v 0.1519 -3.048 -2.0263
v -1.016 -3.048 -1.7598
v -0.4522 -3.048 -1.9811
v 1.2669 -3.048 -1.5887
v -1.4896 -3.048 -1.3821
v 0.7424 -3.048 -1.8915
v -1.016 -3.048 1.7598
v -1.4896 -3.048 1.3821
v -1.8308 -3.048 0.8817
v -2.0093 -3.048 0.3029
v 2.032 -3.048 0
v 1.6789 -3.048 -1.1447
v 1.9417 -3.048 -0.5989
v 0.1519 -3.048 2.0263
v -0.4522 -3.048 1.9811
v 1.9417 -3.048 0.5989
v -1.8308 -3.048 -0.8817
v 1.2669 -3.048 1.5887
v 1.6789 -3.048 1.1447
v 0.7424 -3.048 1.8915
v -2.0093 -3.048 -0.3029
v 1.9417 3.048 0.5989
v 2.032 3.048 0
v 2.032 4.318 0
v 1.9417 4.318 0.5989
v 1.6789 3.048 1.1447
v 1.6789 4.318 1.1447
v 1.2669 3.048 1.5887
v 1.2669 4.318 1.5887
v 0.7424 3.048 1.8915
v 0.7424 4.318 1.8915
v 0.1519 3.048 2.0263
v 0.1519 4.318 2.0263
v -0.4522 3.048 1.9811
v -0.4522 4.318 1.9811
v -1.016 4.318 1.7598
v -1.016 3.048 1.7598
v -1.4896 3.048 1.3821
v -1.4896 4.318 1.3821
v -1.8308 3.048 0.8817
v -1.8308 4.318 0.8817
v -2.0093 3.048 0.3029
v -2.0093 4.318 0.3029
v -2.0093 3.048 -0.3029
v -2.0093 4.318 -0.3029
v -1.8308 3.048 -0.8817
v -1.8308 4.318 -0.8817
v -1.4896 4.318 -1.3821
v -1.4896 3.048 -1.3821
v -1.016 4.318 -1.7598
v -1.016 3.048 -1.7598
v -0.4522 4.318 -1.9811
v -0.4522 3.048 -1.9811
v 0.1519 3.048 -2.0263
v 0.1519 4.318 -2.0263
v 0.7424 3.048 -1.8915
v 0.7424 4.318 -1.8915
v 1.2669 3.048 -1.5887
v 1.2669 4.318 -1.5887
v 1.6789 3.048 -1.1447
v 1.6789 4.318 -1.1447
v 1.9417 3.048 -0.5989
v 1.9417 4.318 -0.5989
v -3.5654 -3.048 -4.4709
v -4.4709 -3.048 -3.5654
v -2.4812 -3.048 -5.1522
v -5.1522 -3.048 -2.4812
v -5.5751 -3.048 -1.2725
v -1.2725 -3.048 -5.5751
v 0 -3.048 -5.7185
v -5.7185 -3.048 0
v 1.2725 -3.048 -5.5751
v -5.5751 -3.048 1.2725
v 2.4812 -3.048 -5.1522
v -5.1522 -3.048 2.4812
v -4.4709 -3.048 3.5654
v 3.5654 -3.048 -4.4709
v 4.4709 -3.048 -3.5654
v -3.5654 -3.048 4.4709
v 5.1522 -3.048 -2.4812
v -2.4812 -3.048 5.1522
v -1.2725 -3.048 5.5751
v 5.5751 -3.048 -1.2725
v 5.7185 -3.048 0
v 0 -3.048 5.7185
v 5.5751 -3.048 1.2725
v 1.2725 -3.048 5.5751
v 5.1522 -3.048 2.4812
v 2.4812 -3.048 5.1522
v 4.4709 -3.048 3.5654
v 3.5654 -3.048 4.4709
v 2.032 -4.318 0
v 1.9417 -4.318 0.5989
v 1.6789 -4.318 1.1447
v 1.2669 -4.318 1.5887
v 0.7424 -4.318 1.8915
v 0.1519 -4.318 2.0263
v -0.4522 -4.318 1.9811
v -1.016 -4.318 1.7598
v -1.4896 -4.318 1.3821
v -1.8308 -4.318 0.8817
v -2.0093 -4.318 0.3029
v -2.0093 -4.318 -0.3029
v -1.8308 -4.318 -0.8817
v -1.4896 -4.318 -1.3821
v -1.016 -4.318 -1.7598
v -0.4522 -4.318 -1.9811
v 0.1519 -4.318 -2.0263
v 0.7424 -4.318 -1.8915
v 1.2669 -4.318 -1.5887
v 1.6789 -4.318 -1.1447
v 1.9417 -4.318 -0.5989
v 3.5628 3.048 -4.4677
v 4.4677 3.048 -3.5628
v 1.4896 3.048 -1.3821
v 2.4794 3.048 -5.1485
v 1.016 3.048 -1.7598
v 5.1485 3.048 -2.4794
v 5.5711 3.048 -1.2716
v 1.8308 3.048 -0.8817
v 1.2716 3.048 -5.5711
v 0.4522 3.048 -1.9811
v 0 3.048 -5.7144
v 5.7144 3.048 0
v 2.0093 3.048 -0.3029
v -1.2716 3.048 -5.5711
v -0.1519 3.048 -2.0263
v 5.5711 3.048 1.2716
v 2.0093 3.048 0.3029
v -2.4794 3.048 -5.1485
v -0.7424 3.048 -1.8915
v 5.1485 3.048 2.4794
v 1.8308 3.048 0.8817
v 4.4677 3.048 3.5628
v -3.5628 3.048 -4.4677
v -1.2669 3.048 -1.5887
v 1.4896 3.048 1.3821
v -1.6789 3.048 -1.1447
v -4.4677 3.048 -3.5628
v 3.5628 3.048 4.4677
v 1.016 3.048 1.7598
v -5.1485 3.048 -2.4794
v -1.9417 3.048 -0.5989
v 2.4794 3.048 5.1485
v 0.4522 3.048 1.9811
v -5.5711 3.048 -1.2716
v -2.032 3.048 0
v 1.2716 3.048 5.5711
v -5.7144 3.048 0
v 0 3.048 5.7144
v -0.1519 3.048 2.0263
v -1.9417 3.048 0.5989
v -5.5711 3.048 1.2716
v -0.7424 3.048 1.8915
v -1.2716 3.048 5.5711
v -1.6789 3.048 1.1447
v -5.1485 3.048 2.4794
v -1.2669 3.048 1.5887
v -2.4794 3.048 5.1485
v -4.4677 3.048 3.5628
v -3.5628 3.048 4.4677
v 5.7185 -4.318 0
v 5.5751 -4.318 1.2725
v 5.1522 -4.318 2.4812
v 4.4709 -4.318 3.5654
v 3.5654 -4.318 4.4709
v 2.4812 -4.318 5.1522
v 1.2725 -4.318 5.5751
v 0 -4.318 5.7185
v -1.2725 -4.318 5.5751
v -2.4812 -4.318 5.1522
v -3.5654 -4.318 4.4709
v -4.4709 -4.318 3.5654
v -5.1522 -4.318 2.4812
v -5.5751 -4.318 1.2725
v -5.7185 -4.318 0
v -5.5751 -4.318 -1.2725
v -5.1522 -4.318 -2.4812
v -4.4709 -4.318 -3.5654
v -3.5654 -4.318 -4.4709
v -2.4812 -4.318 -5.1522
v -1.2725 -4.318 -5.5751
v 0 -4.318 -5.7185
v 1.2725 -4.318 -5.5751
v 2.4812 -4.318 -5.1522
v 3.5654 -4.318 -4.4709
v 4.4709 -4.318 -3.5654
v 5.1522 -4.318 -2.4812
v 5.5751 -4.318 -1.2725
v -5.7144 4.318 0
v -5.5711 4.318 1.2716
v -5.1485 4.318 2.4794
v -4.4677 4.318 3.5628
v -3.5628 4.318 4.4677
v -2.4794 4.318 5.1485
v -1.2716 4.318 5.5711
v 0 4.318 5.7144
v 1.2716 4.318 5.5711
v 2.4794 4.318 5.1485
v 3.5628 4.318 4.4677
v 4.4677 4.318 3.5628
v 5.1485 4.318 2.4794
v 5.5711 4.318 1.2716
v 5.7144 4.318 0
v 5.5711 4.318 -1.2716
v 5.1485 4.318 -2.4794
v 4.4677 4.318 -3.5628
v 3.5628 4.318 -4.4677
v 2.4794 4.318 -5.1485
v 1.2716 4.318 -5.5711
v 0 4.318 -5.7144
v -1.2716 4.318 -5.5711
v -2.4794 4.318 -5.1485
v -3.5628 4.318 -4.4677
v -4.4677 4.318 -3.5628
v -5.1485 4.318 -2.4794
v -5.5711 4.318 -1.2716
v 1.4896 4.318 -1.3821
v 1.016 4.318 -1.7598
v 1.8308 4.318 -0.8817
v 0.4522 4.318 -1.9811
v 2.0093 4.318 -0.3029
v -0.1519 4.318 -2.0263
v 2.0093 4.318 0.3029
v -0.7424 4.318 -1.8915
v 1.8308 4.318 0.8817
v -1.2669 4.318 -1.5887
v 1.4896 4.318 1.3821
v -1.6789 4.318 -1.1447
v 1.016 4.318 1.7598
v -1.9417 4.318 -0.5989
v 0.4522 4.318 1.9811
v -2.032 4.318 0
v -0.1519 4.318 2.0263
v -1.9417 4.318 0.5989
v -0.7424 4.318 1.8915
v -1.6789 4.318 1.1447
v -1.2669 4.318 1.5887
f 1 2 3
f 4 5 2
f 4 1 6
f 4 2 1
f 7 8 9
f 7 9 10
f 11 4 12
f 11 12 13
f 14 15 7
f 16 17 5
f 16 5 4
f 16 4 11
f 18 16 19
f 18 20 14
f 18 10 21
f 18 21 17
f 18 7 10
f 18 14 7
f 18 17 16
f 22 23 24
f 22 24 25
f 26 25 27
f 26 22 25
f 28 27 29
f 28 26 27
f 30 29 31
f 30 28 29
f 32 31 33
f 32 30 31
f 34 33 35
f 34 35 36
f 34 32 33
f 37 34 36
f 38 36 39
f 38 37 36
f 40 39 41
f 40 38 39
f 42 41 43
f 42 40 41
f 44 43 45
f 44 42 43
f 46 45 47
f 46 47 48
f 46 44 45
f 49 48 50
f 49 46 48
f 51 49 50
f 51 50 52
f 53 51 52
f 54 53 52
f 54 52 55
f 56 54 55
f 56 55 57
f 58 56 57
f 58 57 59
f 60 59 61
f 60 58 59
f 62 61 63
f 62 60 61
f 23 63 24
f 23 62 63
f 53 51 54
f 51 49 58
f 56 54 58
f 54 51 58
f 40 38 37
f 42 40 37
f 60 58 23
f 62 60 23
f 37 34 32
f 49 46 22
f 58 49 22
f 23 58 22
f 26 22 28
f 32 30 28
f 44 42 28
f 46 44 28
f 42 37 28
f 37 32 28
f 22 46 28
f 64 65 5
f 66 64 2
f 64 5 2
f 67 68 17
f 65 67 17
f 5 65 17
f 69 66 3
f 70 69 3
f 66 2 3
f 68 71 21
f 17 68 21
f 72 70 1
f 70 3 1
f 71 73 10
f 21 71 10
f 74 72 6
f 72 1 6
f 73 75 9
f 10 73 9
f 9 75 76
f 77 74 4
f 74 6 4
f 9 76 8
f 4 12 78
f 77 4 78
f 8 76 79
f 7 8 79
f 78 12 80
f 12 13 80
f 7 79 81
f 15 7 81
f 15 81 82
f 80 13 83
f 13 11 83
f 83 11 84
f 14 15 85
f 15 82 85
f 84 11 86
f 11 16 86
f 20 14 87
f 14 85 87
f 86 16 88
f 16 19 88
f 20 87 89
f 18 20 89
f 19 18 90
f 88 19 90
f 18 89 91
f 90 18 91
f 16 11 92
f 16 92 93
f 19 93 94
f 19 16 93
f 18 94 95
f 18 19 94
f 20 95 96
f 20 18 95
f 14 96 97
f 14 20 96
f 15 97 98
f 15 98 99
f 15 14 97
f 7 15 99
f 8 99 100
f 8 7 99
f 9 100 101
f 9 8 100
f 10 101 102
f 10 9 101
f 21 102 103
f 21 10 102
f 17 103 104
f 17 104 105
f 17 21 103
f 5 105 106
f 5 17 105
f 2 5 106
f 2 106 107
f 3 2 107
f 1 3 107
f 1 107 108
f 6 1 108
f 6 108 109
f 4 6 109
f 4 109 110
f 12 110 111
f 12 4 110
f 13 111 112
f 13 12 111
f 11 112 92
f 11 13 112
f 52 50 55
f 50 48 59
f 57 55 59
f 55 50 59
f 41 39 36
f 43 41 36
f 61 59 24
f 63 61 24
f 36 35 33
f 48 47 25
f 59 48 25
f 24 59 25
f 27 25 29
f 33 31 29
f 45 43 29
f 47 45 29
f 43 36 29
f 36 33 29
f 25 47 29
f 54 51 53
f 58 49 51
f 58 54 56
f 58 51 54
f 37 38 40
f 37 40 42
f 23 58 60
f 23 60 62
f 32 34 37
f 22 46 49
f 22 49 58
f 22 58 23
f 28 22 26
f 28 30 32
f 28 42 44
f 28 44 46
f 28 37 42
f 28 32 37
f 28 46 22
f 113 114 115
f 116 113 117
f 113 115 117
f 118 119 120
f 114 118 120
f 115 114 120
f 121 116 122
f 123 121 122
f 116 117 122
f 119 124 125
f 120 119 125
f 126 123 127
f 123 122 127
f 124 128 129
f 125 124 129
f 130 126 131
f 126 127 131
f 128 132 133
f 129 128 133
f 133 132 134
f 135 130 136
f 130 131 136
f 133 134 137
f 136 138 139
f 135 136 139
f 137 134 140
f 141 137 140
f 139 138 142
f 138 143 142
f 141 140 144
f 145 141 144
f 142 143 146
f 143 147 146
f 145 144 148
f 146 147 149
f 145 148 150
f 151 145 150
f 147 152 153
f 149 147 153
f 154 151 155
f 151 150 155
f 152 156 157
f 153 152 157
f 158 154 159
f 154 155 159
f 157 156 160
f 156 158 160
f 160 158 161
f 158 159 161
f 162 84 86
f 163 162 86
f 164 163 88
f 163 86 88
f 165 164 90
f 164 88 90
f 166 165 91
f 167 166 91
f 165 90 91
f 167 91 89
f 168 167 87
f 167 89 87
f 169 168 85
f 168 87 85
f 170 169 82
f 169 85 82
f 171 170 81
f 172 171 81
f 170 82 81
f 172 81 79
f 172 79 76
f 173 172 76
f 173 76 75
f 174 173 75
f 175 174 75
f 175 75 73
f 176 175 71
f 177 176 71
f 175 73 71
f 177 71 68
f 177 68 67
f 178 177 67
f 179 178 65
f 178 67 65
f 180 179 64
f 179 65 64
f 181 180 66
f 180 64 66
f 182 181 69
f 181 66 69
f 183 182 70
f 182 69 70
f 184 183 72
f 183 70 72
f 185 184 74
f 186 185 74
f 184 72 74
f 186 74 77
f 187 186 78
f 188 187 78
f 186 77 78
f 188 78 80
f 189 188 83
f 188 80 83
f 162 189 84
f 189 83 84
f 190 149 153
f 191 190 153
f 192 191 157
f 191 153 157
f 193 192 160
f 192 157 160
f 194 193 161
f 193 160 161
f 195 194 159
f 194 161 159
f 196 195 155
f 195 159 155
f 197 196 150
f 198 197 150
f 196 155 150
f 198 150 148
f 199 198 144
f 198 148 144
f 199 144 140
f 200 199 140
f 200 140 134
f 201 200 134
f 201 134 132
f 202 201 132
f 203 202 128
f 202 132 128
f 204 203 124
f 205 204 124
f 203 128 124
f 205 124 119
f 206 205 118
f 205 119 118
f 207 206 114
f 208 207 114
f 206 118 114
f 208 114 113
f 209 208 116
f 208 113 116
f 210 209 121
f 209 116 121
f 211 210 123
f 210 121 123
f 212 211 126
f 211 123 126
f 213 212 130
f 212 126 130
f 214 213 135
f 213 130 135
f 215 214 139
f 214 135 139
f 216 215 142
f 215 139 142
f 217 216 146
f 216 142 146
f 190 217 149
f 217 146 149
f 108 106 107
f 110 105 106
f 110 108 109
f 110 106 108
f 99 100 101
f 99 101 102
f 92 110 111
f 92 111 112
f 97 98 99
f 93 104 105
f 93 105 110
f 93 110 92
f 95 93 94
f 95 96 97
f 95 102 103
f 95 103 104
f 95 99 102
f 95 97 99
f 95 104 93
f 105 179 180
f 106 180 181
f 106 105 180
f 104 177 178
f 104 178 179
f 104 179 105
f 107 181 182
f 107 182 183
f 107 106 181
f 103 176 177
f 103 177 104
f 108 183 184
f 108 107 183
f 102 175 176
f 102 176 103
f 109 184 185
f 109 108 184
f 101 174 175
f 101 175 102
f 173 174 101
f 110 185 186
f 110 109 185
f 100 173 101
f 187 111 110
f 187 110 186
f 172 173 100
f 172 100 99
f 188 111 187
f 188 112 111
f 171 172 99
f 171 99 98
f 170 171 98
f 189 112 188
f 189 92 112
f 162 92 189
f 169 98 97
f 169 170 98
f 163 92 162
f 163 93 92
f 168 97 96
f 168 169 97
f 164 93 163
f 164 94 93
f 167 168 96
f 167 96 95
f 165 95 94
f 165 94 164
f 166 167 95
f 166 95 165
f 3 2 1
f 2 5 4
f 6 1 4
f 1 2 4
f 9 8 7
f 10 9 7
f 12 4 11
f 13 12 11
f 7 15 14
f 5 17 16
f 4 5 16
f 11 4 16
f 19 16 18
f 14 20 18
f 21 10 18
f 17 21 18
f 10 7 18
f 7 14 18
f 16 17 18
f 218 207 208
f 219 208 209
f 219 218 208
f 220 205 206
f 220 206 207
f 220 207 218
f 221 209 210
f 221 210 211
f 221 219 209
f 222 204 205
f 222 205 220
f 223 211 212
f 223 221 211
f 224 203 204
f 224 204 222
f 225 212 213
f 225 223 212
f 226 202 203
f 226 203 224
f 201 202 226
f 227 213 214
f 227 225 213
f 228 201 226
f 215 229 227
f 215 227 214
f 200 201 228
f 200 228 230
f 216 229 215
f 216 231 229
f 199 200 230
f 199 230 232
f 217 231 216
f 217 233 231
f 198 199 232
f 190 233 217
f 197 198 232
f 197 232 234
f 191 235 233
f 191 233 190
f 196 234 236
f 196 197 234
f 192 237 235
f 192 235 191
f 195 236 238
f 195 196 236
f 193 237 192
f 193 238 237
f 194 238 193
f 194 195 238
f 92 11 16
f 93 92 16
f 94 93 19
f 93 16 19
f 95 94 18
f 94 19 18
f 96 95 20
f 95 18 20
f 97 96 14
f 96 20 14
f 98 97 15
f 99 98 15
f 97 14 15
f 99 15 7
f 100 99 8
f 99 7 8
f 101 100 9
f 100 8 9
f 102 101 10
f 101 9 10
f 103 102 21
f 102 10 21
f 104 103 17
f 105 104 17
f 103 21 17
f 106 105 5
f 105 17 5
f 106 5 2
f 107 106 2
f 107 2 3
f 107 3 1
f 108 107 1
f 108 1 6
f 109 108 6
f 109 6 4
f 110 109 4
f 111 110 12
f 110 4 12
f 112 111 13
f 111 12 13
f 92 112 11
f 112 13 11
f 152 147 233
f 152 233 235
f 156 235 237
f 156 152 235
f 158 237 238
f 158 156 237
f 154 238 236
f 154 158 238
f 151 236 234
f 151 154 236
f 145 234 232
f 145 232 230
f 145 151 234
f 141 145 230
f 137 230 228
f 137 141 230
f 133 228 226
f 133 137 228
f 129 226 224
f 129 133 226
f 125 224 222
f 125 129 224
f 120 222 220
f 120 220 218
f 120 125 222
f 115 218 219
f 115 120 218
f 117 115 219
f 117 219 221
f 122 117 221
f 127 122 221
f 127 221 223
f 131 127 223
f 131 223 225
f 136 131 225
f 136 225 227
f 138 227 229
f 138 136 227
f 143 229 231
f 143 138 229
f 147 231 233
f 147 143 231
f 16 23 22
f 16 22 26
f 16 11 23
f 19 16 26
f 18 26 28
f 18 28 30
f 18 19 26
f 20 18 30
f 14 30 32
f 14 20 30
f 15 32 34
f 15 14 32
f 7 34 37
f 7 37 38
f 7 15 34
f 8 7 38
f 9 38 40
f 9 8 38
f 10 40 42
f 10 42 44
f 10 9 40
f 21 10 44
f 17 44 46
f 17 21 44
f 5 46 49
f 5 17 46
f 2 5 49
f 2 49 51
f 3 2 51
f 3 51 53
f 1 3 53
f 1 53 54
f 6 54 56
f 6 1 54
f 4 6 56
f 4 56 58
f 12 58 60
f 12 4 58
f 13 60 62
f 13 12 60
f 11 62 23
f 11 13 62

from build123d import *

# Parameters (mm, degrees)
F0_R     = 2.032
F1_DEPTH = 3.048
F2_DEPTH = 3.048
F3_R     = 5.7143595464
F3_R_2   = 2.032
F4_DEPTH = 1.27
F5_R     = 5.718473568
F5_R_2   = 2.032
F6_DEPTH = 1.27
F7_DEPTH = 1.27
F8_DEPTH = 1.27


with BuildPart() as f1:
    # F0 (on Front) → F1 (new body)
    with BuildSketch(Plane.XZ):
        Circle(F0_R)
    extrude(amount=F1_DEPTH)

    # F2 (add): a face of the model
    f2_faces = [f1.faces().sort_by_distance(p)[0] for p in [
        (0, 0, 0),
    ]]
    extrude(f2_faces, amount=F2_DEPTH)


with BuildPart() as f4:
    # F3 (on face) → F4 (new body)
    with BuildSketch(Plane(origin=(0, 3.048, 0), x_dir=(-1, 0, 0), z_dir=(0, 1, 0))):
        Circle(F3_R)
        Circle(F3_R_2, mode=Mode.SUBTRACT)
    extrude(amount=F4_DEPTH)


with BuildPart() as f6:
    # F5 (on face) → F6 (new body)
    with BuildSketch(Plane.XZ.offset(3.048)):
        Circle(F5_R)
        Circle(F5_R_2, mode=Mode.SUBTRACT)
    extrude(amount=F6_DEPTH)


with BuildPart() as f7:
    # F7 (new): a face of the model
    f7_faces = [f1.part.faces().sort_by_distance(p)[0] for p in [
        (0, 3.048, 0),
    ]]
    extrude(f7_faces, amount=F7_DEPTH)


with BuildPart() as f8:
    # F8 (new): a face of the model
    f8_faces = [f1.part.faces().sort_by_distance(p)[0] for p in [
        (0, -3.048, 0),
    ]]
    extrude(f8_faces, amount=F8_DEPTH)


solid = Compound([f1.part, f4.part, f6.part, f7.part, f8.part])
